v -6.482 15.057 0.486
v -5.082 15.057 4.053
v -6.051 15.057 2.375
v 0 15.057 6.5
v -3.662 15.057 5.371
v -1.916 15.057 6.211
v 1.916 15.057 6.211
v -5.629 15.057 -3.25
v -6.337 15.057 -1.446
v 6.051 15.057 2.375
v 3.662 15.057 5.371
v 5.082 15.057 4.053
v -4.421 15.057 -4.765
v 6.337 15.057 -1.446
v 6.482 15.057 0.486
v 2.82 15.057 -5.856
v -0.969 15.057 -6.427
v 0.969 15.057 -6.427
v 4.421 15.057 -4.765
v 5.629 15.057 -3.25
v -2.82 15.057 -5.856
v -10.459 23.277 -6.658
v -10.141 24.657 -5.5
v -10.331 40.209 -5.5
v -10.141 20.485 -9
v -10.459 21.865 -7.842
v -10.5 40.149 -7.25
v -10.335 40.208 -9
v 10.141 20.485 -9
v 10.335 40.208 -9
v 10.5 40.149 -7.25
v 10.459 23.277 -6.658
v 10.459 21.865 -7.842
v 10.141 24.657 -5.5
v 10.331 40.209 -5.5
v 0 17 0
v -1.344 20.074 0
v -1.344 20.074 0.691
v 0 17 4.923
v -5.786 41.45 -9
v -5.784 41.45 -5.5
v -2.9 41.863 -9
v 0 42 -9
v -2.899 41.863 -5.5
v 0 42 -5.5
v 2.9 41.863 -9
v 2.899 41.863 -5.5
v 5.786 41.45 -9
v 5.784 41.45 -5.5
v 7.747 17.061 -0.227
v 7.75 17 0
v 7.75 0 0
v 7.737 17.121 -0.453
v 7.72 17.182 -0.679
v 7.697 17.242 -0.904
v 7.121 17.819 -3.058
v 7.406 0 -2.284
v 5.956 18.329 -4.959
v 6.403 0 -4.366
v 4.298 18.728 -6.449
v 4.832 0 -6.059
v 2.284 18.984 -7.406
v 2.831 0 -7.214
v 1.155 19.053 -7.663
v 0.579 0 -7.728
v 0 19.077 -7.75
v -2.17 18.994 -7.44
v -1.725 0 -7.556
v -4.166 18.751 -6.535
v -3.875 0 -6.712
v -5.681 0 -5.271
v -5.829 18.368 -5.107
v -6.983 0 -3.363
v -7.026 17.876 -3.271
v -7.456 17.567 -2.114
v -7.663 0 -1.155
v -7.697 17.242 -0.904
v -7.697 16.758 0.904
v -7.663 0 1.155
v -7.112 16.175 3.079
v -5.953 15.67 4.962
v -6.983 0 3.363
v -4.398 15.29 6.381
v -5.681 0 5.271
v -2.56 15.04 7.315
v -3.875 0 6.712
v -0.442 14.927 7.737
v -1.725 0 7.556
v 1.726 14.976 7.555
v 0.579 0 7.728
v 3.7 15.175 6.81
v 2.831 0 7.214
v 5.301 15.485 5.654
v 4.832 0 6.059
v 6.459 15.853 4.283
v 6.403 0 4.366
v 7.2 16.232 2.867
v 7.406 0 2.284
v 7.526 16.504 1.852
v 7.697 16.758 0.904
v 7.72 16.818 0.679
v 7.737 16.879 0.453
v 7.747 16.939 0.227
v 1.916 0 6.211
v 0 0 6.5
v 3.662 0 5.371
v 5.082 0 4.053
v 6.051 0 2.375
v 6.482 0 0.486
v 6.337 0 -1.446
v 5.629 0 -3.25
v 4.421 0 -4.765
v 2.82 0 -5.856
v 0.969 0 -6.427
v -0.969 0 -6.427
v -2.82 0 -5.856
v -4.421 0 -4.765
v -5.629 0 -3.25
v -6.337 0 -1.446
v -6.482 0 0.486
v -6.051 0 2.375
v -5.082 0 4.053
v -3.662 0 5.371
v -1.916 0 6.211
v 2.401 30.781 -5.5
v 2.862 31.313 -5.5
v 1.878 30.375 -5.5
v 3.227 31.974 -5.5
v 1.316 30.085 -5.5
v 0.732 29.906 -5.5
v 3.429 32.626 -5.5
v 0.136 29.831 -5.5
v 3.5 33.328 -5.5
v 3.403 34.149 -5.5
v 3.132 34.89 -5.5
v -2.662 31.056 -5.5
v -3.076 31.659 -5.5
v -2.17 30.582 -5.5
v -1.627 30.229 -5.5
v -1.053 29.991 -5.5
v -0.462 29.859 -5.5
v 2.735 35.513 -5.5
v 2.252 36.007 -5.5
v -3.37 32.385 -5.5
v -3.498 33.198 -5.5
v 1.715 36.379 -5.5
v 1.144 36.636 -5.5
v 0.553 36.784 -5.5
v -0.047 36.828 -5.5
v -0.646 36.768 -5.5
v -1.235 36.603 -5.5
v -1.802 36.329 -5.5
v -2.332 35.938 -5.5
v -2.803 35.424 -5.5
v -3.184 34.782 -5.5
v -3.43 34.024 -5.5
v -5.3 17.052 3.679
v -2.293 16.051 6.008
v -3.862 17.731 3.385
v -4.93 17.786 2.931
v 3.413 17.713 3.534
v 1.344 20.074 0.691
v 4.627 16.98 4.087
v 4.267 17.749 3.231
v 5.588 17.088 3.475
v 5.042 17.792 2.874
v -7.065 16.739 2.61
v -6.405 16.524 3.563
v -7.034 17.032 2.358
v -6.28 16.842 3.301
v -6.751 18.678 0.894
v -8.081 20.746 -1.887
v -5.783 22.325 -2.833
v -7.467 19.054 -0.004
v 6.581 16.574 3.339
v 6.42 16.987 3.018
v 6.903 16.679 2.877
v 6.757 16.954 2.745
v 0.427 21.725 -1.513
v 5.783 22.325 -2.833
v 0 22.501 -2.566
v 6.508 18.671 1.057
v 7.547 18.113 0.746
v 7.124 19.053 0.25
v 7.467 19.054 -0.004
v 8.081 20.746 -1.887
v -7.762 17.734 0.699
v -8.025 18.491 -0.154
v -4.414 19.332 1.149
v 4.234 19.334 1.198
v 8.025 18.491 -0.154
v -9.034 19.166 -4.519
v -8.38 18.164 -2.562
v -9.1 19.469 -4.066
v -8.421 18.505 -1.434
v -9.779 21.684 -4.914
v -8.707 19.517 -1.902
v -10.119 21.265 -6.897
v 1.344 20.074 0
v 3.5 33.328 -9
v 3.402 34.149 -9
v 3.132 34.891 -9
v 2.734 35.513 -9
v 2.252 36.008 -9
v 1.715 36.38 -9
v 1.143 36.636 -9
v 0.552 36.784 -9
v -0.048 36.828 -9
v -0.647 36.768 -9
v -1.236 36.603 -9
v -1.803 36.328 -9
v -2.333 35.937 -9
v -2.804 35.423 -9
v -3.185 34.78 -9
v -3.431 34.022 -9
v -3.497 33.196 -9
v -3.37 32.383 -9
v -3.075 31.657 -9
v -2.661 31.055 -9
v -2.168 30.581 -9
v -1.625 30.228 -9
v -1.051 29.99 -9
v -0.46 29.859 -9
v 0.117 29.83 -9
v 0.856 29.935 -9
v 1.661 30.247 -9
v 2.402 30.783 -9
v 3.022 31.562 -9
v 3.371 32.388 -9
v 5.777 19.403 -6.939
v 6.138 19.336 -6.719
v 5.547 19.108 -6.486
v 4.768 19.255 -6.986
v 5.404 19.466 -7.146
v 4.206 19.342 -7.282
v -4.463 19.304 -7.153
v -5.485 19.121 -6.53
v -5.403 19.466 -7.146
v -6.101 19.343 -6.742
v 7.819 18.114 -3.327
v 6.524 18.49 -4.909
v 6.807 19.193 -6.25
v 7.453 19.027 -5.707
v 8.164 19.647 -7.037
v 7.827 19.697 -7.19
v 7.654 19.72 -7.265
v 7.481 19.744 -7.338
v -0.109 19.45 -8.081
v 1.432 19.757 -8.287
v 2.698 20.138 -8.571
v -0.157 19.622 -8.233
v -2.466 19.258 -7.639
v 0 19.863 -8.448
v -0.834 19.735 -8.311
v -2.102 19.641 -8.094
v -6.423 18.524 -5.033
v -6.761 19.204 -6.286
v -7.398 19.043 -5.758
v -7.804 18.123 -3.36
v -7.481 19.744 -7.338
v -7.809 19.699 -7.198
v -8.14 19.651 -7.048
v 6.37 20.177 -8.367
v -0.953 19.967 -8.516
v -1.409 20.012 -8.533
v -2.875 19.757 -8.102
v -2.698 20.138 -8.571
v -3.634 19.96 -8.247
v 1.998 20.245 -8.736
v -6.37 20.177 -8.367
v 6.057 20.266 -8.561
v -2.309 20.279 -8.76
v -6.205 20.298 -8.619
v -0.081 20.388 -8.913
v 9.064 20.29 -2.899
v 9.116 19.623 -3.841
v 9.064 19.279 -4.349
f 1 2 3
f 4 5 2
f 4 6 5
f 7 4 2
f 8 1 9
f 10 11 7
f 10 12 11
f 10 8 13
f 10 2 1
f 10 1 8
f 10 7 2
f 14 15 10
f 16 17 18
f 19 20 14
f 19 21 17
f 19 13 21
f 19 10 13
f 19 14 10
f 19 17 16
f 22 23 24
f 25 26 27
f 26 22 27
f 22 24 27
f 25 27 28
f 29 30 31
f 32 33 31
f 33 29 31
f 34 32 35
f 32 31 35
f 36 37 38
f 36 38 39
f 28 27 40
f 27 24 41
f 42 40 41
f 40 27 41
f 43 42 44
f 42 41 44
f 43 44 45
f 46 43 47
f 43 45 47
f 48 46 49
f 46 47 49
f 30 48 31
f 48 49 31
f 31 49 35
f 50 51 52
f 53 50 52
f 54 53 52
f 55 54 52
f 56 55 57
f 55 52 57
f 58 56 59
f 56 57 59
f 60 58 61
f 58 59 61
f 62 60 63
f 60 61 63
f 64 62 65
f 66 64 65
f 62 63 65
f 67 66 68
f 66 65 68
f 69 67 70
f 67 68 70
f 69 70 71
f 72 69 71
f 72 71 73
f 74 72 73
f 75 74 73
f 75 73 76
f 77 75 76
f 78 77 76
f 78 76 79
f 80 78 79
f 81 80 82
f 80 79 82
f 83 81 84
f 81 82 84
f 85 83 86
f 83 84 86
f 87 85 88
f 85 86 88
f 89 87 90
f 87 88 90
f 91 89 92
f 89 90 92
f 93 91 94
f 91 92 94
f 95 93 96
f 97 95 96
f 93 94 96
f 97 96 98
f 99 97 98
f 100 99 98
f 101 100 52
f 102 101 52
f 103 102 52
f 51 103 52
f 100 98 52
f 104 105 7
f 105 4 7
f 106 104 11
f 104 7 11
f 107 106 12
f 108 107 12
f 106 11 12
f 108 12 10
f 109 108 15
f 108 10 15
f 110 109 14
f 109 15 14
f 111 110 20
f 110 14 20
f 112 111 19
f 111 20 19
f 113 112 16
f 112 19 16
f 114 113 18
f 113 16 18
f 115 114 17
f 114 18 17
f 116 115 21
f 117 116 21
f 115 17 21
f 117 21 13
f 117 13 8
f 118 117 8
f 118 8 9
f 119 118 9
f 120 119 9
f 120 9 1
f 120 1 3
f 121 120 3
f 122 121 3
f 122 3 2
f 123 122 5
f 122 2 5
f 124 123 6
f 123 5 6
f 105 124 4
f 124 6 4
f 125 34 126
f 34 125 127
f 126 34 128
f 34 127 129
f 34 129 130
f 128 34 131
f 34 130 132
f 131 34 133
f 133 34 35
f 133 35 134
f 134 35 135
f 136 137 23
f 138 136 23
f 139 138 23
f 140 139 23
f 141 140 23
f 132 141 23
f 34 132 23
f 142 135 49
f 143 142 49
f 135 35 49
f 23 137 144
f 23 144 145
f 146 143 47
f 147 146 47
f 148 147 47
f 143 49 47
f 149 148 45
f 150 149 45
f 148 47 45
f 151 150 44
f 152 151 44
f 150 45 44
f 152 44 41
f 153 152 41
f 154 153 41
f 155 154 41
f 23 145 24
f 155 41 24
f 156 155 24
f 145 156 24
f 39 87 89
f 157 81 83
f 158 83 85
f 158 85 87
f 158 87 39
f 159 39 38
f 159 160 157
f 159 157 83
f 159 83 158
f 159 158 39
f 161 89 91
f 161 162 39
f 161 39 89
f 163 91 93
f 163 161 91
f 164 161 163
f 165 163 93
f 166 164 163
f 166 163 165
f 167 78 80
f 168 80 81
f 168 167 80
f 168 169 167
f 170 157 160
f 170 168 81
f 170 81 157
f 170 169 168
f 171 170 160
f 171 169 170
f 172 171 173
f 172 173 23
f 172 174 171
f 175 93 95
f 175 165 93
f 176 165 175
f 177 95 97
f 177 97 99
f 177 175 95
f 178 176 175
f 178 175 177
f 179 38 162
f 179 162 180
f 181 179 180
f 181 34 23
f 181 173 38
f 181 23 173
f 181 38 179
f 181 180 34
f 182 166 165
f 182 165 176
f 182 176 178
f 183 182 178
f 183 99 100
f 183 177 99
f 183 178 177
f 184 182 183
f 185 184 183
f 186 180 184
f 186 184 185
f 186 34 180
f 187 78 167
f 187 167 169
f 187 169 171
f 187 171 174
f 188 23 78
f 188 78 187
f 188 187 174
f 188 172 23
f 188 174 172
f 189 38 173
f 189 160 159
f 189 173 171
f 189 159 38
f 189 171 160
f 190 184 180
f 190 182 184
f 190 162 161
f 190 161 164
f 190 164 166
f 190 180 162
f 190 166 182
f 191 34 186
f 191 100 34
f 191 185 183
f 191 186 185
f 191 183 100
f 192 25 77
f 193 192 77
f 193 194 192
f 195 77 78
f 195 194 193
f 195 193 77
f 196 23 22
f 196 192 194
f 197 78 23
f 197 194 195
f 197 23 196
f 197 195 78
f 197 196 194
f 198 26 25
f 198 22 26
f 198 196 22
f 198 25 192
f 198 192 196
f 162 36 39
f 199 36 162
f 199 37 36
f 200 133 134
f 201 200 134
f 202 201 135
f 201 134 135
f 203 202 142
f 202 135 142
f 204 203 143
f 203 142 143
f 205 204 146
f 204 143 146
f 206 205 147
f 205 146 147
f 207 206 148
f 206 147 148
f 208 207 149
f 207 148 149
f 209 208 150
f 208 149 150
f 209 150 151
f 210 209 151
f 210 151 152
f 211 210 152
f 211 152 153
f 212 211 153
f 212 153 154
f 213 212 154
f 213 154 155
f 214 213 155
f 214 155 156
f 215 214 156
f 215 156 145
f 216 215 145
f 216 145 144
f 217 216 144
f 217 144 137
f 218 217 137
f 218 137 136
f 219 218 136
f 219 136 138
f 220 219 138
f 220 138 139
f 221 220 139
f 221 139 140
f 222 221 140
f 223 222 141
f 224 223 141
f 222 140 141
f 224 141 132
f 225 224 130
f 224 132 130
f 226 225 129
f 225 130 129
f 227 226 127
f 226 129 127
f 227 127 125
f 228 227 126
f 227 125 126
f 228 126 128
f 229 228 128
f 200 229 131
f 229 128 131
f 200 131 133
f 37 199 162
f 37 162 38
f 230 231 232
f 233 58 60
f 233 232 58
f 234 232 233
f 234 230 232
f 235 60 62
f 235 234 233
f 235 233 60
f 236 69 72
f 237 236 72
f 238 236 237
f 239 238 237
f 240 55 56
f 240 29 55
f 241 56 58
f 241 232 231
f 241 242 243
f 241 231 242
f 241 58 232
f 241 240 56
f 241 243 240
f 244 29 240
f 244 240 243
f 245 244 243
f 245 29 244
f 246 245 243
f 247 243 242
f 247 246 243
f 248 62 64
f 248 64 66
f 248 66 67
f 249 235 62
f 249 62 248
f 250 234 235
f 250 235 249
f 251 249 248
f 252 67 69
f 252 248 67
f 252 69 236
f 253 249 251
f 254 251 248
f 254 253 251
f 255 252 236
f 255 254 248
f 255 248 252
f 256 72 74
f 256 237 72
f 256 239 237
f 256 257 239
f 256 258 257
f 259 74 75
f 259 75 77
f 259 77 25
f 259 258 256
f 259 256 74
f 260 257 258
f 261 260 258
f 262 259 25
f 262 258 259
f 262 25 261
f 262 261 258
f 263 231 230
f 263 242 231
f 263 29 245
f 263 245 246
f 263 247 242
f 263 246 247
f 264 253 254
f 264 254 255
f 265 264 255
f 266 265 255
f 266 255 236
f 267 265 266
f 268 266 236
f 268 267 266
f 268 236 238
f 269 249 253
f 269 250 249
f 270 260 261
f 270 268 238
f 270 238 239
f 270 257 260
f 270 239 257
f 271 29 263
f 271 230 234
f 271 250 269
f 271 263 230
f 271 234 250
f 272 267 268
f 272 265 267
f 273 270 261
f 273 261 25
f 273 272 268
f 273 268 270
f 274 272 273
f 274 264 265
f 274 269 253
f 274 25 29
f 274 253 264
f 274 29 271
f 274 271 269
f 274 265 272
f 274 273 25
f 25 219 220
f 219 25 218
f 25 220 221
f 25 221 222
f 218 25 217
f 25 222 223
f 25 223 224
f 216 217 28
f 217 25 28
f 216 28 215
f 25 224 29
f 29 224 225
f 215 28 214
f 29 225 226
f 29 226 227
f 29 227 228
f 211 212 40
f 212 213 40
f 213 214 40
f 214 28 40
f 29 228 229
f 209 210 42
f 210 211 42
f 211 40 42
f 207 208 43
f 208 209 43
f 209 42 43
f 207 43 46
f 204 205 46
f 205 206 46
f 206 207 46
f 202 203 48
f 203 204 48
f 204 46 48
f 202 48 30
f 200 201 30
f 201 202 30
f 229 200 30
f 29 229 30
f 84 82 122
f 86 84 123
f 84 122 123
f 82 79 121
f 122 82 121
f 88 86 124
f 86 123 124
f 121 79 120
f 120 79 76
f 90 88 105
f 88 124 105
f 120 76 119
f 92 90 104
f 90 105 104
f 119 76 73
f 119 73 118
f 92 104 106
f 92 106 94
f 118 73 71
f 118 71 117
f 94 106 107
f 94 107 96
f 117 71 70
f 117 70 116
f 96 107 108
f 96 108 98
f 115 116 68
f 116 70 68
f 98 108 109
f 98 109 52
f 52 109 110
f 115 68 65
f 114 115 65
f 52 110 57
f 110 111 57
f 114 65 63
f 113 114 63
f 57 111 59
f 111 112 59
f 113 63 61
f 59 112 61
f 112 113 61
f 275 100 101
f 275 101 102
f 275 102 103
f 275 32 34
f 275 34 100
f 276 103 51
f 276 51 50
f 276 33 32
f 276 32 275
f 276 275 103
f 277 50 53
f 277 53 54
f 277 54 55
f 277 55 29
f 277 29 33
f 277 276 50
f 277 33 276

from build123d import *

# Parameters (mm, degrees)
BODY_SHAFT_OUTLINE_R      = 7.75
BODY_SHAFT_DEPTH          = 14.923393759
BODY_SHAFT_START          = 14.923393759
BODY_SHAFT_2_OUTLINE_R    = 7.75
BODY_SHAFT_2_DEPTH        = 4.153212482
BODY_SHAFT_START_2        = 16.420739047
BODY_SHAFT_3_OUTLINE_W    = 18
BODY_SHAFT_3_OUTLINE_H    = 19
BODY_SHAFT_3_DEPTH        = 4.579260953
SKETCH26_W                = 6.5
SKETCH26_H                = 15.057368355
SKETCH9_R                 = 3.5
CUT_HOLE_DEPTH            = 45.218209058
CUT_SHOE_RADIUS_DEPTH     = 45.218209058
CUT_INSPECTION_HOLE_DEPTH = 45.218209058


with BuildPart() as part:
    # Body-Shaft: read off the stored shape, not the designer's step
    # Body-Shaft outline → Body-Shaft (new body)
    with BuildSketch(Plane(origin=(0, 0, 0), x_dir=(1, 0, 0), z_dir=(0, 1, 0))):
        Circle(BODY_SHAFT_OUTLINE_R)
    extrude(amount=BODY_SHAFT_DEPTH)

    # Body-Shaft 2 outline → Body-Shaft 2 (add)
    with BuildSketch(Plane(origin=(0, 0, 0), x_dir=(1, 0, 0), z_dir=(0, 1, 0)).offset(BODY_SHAFT_START)):
        Circle(BODY_SHAFT_2_OUTLINE_R)
    extrude(amount=BODY_SHAFT_2_DEPTH)

    # Body-Shaft 3 outline → Body-Shaft 3 (cut)
    with BuildSketch(Plane(origin=(0, 0, 0), x_dir=(1, 0, 0), z_dir=(0, 0.9659258262890682, 0.2588190451025211)).offset(BODY_SHAFT_START_2)):
        with Locations((0, 4.5)):
            Rectangle(BODY_SHAFT_3_OUTLINE_W, BODY_SHAFT_3_OUTLINE_H)
    extrude(amount=BODY_SHAFT_3_DEPTH, mode=Mode.SUBTRACT)

    # Sketch26 → Cut-Shaft (revolve, cut)
    with BuildSketch(Plane.XY, mode=Mode.PRIVATE) as cut_shaft_sk:
        with Locations((3.25, 7.528684178)):
            Rectangle(SKETCH26_W, SKETCH26_H)
    revolve(cut_shaft_sk.sketch.rotate(Axis((0, 0, 0), (0, 1, 0)), 270), axis=Axis((0, 0, 0), (0, 1, 0)), mode=Mode.SUBTRACT)

    # Body-Transition: read off the stored shape, not the designer's step
    # Body-Transition: loft between two sections, ruled curve by curve
    body_transition_from = [
        Edge.make_bspline([(-7.697082096, 16.75774263, 0.904116814), (-6.240942475, 13.436068349, 13.300773997), (6.240942475, 13.436068349, 13.300773997), (7.697082096, 16.75774263, 0.904116814)], [0, 0, 0, 0, 1, 1, 1, 1], 3, [1, 0.411106823, 0.411106823, 1]),
        Edge.make_bspline([(7.697082096, 16.75774263, 0.904116814), (7.767719964, 16.918878271, 0.302750415), (7.767719964, 17.081121729, -0.302750415), (7.697082096, 17.24225737, -0.904116814)], [0, 0, 0, 0, 1, 1, 1, 1], 3, [1, 0.995447922, 0.995447922, 1]),
        Edge.make_bspline([(-7.697082096, 17.24225737, -0.904116814), (-7.767719964, 17.081121729, -0.302750415), (-7.767719964, 16.918878271, 0.302750415), (-7.697082096, 16.75774263, 0.904116814)], [0, 0, 0, 0, 1, 1, 1, 1], 3, [1, 0.995447922, 0.995447922, 1]),
        Edge.make_bspline([(7.697082096, 17.24225737, -0.904116814), (6.240942475, 20.563931651, -13.300773997), (-6.240942475, 20.563931651, -13.300773997), (-7.697082096, 17.24225737, -0.904116814)], [0, 0, 0, 0, 1, 1, 1, 1], 3, [1, 0.411106823, 0.411106823, 1]),
    ]
    body_transition_to = [
        Edge.make_bspline([(-10.140902466, 24.656520189, -5.5), (-3.380300822, 24.656520189, -5.5), (3.380300822, 24.656520189, -5.5), (10.140902466, 24.656520189, -5.5)], [0, 0, 0, 0, 1, 1, 1, 1], 3),
        Edge.make_bspline([(10.140902466, 24.656520189, -5.5), (10.622491976, 23.282361026, -6.653056447), (10.622491976, 21.859541778, -7.846943553), (10.140902466, 20.485382615, -9)], [0, 0, 0, 0, 1, 1, 1, 1], 3, [1, 0.977200157, 0.977200157, 1]),
        Edge.make_bspline([(-10.140902466, 20.485382615, -9), (-10.622491976, 21.859541778, -7.846943553), (-10.622491976, 23.282361026, -6.653056447), (-10.140902466, 24.656520189, -5.5)], [0, 0, 0, 0, 1, 1, 1, 1], 3, [1, 0.977200157, 0.977200157, 1]),
        Edge.make_bspline([(10.140902466, 20.485382615, -9), (3.380300822, 20.485382615, -9), (-3.380300822, 20.485382615, -9), (-10.140902466, 20.485382615, -9)], [0, 0, 0, 0, 1, 1, 1, 1], 3),
    ]
    body_transition = Solid(Shell([*[Face.make_surface_from_curves(body_transition_from[k], body_transition_to[k]) for k in range(4)], Face(Wire(body_transition_from)), Face(Wire(body_transition_to))]))
    add(body_transition)

    # Sketch11 for Body-Shoe → Body-Shoe section 0
    with BuildSketch(Plane(origin=(0, 12.895701516, -15.368498611), x_dir=(-1, 0, 0), z_dir=(1.0474450083328146e-14, 0.6427876096865438, -0.7660444431189743))):
        with BuildLine():
            Line((10.140902466, 9.90762503), (-10.140902466, 9.90762503))
            # circular arc as an exact rational Bezier (weights 1, cos(half-angle), 1)
            Bezier((-10.140902466, 9.90762503), (-10.871813467, 12.630141727), (-10.140902466, 15.352658424), weights=[1, 0.965800235, 1])
            Line((-10.140902466, 15.352658424), (10.140902466, 15.352658424))
            Bezier((10.140902466, 15.352658424), (10.871813467, 12.630141727), (10.140902466, 9.90762503), weights=[1, 0.965800235, 1])
        make_face()
    # Sketch12 for Body-Shoe → Body-Shoe section 1
    with BuildSketch(Plane(origin=(0, 42, 0), x_dir=(-1, 0, 0), z_dir=(0, 1, 0))):
        with BuildLine():
            Line((-10.35313962, -5.5), (10.35313962, -5.5))
            Bezier((10.35313962, -5.5), (10.64894361, -7.25), (10.35313962, -9), weights=[1, 0.986013297, 1])
            Line((10.35313962, -9), (-10.35313962, -9))
            Bezier((-10.35313962, -9), (-10.64894361, -7.25), (-10.35313962, -5.5), weights=[1, 0.986013297, 1])
        make_face()
    loft()

    # Sketch9 → Cut-Hole (cut, through all)
    with BuildSketch(Plane(origin=(0, 0, 0), x_dir=(-1, 0, 0), z_dir=(0, 0, 1))):
        with Locations(Location((0, -33.328260094, 0), (0, 0, 180))):
            Circle(SKETCH9_R)
    extrude(amount=-CUT_HOLE_DEPTH, mode=Mode.SUBTRACT)

    # Sketch15 → Cut-Shoe-Radius (cut, through all)
    with BuildSketch(Plane.XY):
        with BuildLine():
            Line((10.5, 40.148566703), (10.5, 43.851433297))
            Line((10.5, 43.851433297), (-10.5, 43.851433297))
            Line((-10.5, 43.851433297), (-10.5, 40.148566703))
            ThreePointArc((-10.5, 40.148566703), (0, 42), (10.5, 40.148566703))
        make_face()
    extrude(amount=-CUT_SHOE_RADIUS_DEPTH, mode=Mode.SUBTRACT)

    # Sketch17 → Cut-Inspection-Hole (cut, through all)
    with BuildSketch(Plane.XY):
        Polygon((-1.344278322, 20.074283351), (0, 17), (1.344278322, 20.074283351), align=None)
    extrude(amount=CUT_INSPECTION_HOLE_DEPTH, mode=Mode.SUBTRACT)


solid = part.part
